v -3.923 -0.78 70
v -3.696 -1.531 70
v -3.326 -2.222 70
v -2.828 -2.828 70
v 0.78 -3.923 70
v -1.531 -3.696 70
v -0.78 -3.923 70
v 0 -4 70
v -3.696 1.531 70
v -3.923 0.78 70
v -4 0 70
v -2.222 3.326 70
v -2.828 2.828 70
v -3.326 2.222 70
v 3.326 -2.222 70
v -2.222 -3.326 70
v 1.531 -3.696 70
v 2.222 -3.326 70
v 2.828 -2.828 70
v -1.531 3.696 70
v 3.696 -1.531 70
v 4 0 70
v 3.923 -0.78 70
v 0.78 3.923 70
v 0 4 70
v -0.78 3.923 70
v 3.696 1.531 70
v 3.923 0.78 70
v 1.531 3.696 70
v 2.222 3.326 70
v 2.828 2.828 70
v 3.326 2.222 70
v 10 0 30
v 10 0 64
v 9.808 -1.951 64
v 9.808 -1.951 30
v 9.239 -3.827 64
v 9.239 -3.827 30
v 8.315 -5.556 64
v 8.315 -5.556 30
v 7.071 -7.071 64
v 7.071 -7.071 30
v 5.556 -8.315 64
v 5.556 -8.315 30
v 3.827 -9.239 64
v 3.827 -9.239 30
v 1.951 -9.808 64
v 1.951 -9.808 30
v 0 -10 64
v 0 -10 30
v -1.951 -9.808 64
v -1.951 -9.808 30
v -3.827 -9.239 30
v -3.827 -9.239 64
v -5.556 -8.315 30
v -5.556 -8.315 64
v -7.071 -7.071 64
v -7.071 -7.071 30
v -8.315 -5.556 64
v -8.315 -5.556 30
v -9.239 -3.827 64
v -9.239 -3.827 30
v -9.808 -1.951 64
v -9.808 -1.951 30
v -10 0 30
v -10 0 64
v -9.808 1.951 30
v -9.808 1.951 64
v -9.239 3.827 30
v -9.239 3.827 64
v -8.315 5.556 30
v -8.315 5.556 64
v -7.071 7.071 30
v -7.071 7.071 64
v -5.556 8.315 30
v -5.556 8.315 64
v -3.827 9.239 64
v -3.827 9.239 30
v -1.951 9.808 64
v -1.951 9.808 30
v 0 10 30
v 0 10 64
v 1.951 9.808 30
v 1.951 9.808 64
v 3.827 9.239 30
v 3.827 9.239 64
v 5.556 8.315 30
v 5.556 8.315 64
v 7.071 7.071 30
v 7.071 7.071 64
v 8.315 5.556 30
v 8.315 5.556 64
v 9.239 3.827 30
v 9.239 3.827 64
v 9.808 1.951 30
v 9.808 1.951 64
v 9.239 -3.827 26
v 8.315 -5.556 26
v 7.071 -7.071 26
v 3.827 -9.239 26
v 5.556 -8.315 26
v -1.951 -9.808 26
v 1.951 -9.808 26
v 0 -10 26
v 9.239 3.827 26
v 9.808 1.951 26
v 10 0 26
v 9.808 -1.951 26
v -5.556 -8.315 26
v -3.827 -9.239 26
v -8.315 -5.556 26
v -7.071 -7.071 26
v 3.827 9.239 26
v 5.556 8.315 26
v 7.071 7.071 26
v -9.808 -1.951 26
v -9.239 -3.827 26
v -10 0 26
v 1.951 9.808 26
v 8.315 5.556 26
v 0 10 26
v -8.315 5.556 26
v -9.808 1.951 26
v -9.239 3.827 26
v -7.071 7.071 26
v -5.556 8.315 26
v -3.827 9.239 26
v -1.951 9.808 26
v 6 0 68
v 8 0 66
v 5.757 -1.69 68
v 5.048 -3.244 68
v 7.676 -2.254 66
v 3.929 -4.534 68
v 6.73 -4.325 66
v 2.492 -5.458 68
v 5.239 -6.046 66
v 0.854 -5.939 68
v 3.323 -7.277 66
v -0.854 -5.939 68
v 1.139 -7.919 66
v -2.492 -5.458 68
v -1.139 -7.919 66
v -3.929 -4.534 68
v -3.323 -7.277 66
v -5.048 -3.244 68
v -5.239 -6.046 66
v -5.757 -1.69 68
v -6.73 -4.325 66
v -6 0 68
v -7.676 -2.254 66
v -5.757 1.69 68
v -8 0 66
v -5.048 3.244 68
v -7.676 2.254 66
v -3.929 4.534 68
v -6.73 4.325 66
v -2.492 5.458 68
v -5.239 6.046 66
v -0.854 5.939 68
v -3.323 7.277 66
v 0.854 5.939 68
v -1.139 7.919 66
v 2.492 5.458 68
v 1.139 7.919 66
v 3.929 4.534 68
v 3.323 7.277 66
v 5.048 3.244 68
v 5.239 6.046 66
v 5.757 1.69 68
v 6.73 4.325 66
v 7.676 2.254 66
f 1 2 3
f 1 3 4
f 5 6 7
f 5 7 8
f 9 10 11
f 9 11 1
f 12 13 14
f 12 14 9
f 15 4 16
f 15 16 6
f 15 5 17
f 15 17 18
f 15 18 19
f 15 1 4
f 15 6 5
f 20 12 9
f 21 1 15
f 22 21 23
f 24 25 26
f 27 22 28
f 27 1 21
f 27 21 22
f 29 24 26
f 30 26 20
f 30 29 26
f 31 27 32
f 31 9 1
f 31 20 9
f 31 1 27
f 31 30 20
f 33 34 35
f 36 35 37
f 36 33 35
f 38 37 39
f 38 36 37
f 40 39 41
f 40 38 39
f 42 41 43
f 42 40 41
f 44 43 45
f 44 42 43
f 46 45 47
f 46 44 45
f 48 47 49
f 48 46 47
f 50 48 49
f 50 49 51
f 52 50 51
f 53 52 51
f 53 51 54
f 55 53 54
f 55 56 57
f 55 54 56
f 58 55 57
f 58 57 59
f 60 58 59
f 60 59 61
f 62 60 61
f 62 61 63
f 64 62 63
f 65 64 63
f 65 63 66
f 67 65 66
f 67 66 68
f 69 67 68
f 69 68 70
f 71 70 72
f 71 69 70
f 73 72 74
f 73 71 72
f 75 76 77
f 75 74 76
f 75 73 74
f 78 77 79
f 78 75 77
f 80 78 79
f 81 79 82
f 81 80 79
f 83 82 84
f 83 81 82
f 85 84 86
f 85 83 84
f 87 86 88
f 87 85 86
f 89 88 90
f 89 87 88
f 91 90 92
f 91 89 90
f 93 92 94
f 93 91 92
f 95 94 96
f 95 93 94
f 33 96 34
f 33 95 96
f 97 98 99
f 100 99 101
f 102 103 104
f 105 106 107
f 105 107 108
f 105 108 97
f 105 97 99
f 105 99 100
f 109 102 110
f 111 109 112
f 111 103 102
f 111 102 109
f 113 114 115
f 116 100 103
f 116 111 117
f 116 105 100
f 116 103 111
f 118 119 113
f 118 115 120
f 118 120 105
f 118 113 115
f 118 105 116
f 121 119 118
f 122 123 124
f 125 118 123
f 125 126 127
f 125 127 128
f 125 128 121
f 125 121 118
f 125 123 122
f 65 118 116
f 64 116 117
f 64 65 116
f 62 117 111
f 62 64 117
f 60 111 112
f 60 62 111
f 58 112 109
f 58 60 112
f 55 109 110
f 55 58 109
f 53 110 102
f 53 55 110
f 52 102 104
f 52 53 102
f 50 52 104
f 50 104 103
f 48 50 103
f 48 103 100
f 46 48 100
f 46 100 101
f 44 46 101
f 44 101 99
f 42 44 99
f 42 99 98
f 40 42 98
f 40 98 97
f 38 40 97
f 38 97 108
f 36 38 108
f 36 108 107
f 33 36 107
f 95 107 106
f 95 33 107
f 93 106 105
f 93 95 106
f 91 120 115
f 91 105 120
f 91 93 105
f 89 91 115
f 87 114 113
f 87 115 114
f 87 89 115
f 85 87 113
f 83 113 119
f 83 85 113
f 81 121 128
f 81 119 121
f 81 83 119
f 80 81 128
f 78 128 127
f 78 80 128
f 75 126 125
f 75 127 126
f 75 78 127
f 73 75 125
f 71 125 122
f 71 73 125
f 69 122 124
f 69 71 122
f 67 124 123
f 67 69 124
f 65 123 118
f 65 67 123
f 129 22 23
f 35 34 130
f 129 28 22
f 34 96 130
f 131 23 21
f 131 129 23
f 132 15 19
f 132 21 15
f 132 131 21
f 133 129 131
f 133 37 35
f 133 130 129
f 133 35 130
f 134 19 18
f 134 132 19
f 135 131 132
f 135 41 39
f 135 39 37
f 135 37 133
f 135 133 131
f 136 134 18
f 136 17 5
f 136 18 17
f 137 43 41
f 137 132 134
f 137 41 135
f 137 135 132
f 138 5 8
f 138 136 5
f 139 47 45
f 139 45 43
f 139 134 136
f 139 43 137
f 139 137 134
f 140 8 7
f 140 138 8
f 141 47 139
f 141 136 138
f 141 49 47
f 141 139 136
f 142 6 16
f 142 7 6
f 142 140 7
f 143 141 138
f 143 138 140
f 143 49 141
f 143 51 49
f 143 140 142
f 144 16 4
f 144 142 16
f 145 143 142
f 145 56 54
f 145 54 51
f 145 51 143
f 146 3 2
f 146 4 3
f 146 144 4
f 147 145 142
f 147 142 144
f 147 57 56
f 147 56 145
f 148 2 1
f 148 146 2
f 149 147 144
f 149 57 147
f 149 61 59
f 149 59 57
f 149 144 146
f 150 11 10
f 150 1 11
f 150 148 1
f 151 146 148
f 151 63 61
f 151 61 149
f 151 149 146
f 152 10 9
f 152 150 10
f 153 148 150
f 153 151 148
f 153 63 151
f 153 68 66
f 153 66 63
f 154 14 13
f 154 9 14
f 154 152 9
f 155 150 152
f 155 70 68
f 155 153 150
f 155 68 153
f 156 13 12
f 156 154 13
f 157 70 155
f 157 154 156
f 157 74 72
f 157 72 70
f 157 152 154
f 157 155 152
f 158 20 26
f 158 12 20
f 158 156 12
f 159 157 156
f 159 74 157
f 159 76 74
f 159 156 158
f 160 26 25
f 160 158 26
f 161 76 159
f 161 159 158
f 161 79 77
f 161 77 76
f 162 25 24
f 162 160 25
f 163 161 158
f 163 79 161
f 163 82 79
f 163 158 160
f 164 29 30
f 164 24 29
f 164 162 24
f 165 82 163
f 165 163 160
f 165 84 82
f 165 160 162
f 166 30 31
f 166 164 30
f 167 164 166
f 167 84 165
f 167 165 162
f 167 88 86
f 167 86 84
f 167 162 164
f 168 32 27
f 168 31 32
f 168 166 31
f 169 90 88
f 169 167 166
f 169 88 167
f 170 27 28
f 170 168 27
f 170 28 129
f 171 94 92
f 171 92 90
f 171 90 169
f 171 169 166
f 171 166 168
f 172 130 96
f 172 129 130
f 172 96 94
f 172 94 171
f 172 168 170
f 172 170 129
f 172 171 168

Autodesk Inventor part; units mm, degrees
ref_plane "YZ Plane" through (0, 0, 0) normal (1, 0, 0) x (0, 1, 0)
ref_plane "XZ Plane" through (0, 0, 0) normal (0, 1, 0) x (-1, 0, 0)
ref_plane "XY Plane" through (0, 0, 0) normal (0, 0, 1) x (1, 0, 0)
ref_plane "Work Plane3" through (0, 0, 30) normal (0, 0, 1) x (1, 0, 0)
sketch "Sketch2" plane through (0, 0, 30) normal (0, 0, 1) x (1, 0, 0)
  arc A0 (80, 65) -> (65, 80) centre (65, 65) ccw projected
  line L0 (80, 65) -> (80, -65) projected
  arc A1 (65, -80) -> (80, -65) centre (65, -65) ccw projected
  line L1 (65, -80) -> (-65, -80) projected
  arc A2 (-80, -65) -> (-65, -80) centre (-65, -65) ccw projected
  line L2 (-80, -65) -> (-80, 65) projected
  arc A3 (-65, 80) -> (-80, 65) centre (-65, 65) ccw projected
  line L3 (-65, 80) -> (65, 80) projected
  line L4 (-150, -150) -> (150, -150) projected
  line L5 (150, -150) -> (150, 150) projected
  line L6 (150, 150) -> (-150, 150) projected
  line L7 (-150, 150) -> (-150, -150) projected
  circle A4 centre (0, 0) radius 10
  circle A5 centre (-67, -107.5) radius 1.95 projected
  circle A6 centre (67, 107.5) radius 1.95 projected
  circle A7 centre (-67, 107.5) radius 1.95 projected
  circle A8 centre (67, -107.5) radius 1.95 projected
  dimension "d0" = 20
extrude "Extrusion1" add sketch "Sketch2" along normal blind 40 contours A4
chamfer "Chamfer2" distance 6 angle 45 1 edges at (-10, 0, 70)
sketch "Sketch3" plane through (0, 0, 30) normal (0, 0, -1) x (-1, 0, 0)
  circle A0 centre (0, 0) radius 10 projected
  circle A1 centre (0, 0) radius 10
  dimension "d9" = 20
extrude "Extrusion2" add sketch "Sketch3" along normal blind 4
properties part number "00_Microscope_Objective"
